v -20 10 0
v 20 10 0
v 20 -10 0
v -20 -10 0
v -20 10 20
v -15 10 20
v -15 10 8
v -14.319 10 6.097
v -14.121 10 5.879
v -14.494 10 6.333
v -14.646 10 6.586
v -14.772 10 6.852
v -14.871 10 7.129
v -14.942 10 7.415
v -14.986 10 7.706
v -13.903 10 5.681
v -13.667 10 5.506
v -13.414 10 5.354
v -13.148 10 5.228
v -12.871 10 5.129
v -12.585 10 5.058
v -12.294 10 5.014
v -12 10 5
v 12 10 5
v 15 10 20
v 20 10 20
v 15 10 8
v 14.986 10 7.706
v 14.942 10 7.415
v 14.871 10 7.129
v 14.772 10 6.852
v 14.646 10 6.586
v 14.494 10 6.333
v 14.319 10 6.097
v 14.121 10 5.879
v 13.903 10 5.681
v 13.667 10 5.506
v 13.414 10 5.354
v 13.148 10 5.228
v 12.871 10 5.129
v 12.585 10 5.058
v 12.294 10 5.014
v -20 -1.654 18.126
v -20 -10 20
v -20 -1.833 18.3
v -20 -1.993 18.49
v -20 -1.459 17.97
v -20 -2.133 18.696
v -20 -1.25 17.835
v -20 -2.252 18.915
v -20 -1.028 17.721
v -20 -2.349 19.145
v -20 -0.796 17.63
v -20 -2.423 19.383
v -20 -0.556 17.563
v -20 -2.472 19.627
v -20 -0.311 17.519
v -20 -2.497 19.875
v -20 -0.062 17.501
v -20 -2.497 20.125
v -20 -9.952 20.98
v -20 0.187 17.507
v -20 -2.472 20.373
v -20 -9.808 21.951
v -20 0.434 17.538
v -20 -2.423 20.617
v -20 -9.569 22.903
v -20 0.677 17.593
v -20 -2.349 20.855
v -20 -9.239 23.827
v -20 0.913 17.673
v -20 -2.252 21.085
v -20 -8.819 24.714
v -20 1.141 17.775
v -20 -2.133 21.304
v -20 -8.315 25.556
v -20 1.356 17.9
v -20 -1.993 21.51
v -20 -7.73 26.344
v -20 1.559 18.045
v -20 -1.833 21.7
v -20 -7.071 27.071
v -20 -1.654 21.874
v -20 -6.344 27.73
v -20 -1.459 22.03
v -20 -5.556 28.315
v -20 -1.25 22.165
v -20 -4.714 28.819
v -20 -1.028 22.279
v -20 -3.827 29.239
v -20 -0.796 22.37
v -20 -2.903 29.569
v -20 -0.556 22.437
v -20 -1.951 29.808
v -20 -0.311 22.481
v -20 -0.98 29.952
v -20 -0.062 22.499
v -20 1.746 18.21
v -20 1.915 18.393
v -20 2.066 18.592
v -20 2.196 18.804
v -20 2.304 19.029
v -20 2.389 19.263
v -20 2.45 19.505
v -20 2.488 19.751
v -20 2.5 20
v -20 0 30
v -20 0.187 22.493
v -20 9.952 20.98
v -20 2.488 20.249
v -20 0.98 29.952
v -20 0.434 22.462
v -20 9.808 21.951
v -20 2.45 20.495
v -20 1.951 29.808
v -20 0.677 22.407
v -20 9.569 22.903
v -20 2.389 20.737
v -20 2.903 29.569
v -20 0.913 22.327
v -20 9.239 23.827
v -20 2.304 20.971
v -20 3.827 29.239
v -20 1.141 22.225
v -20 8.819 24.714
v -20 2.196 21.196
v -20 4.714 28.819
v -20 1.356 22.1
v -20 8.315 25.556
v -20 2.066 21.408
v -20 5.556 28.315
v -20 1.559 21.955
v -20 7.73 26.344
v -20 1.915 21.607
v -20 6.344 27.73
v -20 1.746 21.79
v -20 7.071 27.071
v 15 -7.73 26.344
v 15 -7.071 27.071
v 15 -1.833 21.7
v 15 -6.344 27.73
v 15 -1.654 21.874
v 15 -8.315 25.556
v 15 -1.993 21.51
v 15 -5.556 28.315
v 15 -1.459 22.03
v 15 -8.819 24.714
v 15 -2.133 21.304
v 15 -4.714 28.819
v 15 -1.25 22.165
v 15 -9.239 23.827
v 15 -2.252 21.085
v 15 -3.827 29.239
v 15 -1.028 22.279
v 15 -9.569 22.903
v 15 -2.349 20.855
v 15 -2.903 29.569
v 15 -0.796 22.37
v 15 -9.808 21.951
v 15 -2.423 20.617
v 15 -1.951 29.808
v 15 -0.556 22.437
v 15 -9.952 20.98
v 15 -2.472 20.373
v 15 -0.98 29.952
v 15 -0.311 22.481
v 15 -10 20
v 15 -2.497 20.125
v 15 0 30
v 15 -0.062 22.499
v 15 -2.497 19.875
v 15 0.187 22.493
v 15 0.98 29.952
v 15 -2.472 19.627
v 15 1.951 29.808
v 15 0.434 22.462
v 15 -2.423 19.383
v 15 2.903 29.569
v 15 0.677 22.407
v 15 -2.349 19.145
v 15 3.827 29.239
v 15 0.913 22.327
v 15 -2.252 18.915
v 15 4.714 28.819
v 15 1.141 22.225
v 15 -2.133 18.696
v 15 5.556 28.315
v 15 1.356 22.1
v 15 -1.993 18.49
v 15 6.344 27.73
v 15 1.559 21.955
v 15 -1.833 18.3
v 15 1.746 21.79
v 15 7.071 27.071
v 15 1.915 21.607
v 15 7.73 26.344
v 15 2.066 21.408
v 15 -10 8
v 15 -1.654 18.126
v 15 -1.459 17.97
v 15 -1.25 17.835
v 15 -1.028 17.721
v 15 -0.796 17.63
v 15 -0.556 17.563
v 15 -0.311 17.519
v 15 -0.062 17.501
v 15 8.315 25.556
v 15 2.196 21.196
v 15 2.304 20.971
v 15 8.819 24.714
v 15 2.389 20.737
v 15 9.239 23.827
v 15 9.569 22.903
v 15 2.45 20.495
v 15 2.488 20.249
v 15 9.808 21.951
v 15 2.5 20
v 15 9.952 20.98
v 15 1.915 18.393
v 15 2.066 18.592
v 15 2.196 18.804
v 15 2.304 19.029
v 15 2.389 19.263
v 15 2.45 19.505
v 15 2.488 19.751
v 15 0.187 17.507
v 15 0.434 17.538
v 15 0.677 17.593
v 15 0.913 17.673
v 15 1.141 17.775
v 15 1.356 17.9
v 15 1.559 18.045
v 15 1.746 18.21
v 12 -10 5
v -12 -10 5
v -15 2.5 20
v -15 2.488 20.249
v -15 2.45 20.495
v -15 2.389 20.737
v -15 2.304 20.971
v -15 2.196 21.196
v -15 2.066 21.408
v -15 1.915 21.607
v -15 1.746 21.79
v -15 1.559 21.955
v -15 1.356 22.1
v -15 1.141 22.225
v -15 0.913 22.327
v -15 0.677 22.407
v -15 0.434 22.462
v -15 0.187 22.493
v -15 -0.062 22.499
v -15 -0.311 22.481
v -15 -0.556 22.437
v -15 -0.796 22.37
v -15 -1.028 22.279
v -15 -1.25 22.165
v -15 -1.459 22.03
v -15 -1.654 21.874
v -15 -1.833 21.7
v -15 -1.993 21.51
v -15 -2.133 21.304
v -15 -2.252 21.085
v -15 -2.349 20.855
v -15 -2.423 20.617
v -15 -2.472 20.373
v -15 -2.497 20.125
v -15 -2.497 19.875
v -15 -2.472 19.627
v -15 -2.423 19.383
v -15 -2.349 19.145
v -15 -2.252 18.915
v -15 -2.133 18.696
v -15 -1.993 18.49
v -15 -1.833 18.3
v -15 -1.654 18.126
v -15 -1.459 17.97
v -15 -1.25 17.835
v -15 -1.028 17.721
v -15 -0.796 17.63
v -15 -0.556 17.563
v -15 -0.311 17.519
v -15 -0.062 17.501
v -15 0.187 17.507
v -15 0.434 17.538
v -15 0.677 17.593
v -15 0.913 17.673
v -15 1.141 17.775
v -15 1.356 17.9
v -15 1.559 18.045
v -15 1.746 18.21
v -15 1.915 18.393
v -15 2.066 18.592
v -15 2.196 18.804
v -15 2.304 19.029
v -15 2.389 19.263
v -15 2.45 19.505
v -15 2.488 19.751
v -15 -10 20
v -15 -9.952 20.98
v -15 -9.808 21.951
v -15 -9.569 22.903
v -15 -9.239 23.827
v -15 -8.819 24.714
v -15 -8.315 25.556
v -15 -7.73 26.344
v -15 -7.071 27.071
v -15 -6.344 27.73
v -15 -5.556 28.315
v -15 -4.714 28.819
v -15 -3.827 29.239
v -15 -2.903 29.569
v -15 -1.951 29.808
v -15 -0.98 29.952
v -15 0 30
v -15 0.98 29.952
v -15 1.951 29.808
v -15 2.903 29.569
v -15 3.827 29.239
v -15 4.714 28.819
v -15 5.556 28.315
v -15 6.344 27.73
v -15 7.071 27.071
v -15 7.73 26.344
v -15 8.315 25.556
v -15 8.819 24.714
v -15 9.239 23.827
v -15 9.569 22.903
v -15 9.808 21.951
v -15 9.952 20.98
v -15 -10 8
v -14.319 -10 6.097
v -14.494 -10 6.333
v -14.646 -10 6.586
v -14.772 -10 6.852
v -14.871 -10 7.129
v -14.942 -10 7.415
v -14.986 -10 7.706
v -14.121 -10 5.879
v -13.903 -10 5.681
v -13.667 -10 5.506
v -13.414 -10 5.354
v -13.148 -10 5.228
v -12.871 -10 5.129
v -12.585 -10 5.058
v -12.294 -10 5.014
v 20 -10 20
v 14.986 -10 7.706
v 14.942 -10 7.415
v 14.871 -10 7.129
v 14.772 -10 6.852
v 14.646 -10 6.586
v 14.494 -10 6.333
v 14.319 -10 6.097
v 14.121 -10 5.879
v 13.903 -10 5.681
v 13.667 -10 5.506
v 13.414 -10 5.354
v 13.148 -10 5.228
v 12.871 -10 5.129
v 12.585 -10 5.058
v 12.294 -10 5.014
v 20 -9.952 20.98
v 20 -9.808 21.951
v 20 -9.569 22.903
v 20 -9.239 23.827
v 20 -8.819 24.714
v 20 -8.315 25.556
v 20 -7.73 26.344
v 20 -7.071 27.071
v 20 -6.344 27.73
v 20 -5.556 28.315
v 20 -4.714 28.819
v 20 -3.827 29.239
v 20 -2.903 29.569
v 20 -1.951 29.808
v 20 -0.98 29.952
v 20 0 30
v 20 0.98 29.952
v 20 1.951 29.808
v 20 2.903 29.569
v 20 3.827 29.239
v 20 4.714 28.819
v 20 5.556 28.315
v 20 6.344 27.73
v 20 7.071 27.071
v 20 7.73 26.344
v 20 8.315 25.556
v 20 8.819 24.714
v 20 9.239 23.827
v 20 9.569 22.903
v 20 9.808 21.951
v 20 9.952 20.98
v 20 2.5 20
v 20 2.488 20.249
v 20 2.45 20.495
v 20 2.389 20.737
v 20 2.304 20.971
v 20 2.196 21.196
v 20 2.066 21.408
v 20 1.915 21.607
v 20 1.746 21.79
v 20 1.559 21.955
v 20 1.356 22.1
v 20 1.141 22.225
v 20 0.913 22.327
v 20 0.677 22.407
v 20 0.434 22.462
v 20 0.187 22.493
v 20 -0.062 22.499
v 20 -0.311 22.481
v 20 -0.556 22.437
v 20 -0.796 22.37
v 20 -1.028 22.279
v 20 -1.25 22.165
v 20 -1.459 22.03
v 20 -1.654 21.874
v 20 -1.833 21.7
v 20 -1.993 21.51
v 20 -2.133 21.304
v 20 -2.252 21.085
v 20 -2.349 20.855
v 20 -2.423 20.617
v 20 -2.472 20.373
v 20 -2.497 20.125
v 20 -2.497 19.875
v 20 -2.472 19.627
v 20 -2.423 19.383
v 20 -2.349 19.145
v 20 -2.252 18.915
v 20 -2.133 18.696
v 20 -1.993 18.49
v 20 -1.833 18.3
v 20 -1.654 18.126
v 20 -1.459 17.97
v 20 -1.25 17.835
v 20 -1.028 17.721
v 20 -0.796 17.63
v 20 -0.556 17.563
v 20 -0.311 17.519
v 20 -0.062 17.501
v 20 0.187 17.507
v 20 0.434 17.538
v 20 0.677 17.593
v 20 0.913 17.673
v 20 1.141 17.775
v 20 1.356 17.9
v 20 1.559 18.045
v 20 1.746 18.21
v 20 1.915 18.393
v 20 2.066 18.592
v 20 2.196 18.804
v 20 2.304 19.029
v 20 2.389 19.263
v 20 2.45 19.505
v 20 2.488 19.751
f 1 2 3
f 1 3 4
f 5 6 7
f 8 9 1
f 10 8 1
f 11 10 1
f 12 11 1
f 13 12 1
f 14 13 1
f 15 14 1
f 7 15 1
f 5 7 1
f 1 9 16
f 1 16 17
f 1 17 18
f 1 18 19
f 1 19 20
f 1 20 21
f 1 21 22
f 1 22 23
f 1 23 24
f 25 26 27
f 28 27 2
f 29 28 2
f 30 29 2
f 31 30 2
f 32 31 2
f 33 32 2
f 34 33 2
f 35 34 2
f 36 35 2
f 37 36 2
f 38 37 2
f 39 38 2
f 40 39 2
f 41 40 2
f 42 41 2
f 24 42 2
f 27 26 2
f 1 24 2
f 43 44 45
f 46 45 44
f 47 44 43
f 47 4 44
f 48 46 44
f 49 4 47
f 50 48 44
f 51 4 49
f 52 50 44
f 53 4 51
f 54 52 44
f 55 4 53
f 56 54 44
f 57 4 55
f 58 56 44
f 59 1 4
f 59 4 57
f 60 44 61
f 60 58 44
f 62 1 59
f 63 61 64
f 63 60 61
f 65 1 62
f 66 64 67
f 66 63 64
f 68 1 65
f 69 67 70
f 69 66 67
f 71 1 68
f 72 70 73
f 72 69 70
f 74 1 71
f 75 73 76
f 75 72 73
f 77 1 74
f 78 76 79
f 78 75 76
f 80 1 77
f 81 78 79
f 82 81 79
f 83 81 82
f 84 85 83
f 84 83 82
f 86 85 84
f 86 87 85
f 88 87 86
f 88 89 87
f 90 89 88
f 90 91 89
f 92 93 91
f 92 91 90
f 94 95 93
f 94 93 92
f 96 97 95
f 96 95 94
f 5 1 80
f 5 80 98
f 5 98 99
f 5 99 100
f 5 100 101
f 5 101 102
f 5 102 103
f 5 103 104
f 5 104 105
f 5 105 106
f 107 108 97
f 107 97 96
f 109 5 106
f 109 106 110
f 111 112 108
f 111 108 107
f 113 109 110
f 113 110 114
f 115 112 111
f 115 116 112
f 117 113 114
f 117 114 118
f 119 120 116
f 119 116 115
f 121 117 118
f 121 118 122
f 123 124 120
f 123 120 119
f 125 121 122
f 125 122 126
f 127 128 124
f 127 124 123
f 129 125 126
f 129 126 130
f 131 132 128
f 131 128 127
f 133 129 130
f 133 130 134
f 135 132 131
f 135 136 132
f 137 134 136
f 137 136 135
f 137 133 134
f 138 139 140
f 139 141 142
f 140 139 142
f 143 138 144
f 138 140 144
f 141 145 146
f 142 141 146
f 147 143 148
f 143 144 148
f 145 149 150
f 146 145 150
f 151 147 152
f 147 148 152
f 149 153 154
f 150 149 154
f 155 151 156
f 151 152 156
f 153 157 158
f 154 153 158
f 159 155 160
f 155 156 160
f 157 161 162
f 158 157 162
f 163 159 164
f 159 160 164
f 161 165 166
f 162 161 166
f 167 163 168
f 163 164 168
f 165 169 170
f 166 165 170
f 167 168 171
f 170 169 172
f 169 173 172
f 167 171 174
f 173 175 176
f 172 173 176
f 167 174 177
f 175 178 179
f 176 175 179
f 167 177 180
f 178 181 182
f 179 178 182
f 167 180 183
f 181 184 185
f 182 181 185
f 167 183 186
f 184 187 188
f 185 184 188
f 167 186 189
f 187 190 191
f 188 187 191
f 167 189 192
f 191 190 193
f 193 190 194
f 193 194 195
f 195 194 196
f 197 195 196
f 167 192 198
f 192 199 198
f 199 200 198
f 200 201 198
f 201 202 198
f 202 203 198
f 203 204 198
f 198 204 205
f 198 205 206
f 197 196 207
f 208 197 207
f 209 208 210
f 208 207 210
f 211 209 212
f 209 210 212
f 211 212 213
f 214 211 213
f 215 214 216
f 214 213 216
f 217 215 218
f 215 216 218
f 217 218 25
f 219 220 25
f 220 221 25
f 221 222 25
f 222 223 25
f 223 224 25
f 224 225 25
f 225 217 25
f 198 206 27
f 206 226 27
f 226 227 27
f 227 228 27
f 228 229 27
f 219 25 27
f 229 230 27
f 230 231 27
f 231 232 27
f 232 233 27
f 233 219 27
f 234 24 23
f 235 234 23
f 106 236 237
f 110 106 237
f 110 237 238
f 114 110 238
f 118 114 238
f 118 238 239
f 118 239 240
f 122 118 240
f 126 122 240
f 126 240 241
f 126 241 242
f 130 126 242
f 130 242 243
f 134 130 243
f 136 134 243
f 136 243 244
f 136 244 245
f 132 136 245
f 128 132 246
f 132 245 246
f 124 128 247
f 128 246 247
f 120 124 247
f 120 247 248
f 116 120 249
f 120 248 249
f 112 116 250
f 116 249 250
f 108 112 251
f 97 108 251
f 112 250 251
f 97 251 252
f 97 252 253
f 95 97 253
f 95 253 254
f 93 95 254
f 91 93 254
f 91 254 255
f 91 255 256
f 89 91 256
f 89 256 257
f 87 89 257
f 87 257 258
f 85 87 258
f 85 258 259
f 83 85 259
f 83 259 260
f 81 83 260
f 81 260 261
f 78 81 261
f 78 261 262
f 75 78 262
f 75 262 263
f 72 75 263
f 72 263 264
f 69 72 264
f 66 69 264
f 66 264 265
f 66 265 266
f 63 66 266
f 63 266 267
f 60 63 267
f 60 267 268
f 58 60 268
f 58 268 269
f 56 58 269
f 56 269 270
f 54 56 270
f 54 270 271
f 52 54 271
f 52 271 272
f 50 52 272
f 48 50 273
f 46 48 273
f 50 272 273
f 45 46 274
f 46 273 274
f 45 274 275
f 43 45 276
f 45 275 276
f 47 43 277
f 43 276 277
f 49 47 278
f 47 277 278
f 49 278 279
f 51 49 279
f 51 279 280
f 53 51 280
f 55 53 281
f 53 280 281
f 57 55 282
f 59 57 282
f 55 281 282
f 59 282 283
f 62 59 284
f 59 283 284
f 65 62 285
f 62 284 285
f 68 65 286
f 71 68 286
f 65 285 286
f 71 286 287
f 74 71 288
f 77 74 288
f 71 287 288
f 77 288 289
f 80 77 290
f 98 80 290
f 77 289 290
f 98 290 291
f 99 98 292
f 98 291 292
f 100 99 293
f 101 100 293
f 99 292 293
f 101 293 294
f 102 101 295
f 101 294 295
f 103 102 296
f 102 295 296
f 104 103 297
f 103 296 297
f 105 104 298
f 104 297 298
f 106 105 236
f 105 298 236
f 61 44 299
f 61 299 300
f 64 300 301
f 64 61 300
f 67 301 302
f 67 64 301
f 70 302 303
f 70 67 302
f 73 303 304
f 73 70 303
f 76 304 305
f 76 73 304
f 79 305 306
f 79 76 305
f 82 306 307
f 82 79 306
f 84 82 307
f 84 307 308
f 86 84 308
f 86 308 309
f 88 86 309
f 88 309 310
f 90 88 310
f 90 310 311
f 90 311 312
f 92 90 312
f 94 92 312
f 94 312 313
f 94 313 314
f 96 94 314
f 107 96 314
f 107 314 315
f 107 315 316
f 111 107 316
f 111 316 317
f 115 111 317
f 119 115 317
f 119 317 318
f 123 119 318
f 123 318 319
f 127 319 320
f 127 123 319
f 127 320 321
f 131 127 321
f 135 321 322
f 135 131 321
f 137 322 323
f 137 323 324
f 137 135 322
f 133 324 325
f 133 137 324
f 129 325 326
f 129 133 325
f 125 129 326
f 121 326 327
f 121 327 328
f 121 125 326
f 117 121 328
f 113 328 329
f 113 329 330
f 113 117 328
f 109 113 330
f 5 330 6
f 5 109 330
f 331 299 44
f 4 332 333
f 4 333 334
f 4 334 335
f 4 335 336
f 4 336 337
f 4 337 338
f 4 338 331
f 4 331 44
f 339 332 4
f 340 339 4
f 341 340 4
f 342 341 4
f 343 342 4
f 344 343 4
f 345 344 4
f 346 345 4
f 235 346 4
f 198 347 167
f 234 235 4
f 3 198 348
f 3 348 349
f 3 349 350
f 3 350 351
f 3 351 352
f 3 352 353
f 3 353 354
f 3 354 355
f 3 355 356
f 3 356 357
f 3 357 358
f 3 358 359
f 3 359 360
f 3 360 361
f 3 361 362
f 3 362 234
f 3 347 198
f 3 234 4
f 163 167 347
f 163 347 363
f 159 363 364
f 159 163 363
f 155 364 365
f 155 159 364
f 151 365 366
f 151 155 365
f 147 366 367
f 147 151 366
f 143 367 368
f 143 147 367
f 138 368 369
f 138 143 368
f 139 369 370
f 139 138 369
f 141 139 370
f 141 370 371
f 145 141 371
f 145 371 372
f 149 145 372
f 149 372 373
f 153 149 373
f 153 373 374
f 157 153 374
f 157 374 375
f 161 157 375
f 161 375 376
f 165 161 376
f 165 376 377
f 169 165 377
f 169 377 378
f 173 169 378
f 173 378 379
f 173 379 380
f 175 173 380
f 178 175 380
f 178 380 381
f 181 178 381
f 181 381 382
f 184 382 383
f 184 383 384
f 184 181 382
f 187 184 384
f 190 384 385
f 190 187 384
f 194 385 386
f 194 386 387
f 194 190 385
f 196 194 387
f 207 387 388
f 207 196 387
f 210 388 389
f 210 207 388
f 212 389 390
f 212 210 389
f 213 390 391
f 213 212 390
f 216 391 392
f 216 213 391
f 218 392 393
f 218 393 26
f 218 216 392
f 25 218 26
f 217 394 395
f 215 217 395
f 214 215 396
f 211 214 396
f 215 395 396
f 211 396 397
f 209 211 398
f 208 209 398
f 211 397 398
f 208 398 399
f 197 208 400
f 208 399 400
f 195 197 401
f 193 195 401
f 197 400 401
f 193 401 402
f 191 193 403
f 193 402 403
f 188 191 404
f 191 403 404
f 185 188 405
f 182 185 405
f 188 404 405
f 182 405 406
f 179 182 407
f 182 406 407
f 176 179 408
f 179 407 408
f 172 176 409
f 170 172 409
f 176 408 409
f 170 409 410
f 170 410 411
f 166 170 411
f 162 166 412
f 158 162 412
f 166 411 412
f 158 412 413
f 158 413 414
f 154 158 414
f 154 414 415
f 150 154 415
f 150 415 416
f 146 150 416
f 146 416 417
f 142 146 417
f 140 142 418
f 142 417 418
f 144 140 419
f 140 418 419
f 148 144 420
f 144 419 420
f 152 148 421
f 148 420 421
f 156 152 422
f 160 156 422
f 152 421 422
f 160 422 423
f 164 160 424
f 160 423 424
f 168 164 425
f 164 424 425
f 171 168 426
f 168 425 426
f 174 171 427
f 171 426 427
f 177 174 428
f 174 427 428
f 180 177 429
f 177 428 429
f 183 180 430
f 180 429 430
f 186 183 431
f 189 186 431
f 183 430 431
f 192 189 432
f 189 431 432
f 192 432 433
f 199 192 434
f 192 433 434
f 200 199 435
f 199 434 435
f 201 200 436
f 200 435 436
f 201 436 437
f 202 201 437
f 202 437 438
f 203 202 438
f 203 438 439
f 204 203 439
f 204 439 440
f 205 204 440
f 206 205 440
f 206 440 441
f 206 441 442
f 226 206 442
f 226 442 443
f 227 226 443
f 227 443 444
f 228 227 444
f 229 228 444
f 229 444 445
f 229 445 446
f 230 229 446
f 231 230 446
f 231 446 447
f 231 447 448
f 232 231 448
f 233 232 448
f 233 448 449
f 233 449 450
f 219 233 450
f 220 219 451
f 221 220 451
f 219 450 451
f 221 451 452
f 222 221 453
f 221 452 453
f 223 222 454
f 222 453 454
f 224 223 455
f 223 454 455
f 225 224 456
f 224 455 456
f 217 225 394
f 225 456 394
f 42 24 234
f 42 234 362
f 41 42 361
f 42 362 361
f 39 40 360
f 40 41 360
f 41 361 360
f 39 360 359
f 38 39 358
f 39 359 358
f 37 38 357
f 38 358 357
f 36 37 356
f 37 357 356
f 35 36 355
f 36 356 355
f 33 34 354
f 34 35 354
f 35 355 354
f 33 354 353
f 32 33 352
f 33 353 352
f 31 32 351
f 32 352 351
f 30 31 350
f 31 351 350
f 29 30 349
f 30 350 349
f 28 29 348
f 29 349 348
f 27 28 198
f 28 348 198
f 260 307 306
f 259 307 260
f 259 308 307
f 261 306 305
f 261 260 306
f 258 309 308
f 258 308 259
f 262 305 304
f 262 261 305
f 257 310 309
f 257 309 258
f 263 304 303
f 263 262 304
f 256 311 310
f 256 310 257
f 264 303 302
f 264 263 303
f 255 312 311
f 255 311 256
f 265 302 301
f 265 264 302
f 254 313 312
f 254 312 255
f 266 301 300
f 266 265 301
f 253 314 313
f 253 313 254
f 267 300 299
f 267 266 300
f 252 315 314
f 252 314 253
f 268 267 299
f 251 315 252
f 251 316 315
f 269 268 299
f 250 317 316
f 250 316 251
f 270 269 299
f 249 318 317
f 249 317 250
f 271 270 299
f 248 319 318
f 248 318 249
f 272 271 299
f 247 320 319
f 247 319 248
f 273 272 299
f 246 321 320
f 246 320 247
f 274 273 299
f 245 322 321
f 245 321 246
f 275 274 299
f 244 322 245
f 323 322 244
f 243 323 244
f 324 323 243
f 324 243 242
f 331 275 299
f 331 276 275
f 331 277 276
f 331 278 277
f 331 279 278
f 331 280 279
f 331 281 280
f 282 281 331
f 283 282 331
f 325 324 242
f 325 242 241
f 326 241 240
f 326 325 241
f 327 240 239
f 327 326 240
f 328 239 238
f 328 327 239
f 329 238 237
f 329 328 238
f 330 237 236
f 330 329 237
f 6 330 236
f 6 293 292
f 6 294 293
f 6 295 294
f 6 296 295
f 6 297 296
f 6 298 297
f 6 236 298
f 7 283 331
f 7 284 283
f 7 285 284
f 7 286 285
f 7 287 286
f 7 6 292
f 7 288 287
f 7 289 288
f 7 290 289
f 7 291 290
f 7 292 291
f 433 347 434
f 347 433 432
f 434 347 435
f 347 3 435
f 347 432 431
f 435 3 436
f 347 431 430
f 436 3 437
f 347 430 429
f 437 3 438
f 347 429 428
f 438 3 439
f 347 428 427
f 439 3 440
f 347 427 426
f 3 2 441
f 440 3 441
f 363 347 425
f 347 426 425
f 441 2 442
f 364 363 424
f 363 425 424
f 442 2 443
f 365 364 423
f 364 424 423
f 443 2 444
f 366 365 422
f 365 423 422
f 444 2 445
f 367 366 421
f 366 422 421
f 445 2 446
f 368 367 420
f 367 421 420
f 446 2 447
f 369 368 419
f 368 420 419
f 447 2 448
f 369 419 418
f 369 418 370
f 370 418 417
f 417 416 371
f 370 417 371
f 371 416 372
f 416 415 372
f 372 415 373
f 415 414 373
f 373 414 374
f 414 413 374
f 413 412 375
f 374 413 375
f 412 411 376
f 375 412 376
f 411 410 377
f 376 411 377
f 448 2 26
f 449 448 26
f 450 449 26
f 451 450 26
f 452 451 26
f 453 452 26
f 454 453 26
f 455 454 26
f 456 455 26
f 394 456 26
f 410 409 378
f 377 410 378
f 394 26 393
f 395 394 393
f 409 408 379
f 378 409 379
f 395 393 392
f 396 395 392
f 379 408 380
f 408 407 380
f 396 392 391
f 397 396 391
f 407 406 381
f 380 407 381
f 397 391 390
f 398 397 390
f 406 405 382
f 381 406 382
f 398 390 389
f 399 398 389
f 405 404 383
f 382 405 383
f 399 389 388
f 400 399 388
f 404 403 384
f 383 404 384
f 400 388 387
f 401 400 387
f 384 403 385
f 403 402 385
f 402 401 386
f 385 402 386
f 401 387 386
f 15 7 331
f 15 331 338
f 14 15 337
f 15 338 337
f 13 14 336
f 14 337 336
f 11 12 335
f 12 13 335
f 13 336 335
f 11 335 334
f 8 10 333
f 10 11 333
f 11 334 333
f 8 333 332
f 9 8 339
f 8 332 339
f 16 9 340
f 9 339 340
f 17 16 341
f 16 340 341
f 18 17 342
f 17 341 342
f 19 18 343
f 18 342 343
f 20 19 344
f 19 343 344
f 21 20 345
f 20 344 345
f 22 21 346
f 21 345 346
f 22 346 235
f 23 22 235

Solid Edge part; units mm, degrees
sketch "Sketch1" plane through (0, 0, 0) normal (0, -1, 0) x (1, 0, 0)
  line L0 (15, 30) -> (15, 5)
  line L1 (15, 5) -> (0, 5)
  line L2 (-15, 5) -> (0, 5)
  line L3 (-15, 30) -> (-15, 5)
  line L4 (-20, 30) -> (-15, 30)
  line L5 (-20, 0) -> (-20, 30)
  line L6 (0, 0) -> (-20, 0)
  line L7 (0, 0) -> (20, 0)
  line L8 (20, 0) -> (20, 30)
  line L9 (20, 30) -> (15, 30)
extrude "ProtrusiónExtruida_1" add sketch "Sketch1" along normal mid plane 20
sketch "Sketch2" plane through (20, 0, 15) normal (1, 0, 0) x (0, 1, 0)
  line L0 (0, 15) -> (10, 15)
  line L1 (10, 5) -> (10, 15)
  arc A0 (0, 15) -> (10, 5) centre (0, 5) cw
  line L2 (-10, 5) -> (-10, 15)
  line L3 (-10, 15) -> (0, 15)
  arc A1 (-10, 5) -> (0, 15) centre (0, 5) cw
  circle A2 centre (0, 5) radius 2.5
extrude "VaciadoExtruido_1" cut sketch "Sketch2" along normal mid plane 152.2925
fillet "Redondeo_1" radius 3 2 edges at (-15, 0, 5) (15, 0, 5)
properties material "PLA"
